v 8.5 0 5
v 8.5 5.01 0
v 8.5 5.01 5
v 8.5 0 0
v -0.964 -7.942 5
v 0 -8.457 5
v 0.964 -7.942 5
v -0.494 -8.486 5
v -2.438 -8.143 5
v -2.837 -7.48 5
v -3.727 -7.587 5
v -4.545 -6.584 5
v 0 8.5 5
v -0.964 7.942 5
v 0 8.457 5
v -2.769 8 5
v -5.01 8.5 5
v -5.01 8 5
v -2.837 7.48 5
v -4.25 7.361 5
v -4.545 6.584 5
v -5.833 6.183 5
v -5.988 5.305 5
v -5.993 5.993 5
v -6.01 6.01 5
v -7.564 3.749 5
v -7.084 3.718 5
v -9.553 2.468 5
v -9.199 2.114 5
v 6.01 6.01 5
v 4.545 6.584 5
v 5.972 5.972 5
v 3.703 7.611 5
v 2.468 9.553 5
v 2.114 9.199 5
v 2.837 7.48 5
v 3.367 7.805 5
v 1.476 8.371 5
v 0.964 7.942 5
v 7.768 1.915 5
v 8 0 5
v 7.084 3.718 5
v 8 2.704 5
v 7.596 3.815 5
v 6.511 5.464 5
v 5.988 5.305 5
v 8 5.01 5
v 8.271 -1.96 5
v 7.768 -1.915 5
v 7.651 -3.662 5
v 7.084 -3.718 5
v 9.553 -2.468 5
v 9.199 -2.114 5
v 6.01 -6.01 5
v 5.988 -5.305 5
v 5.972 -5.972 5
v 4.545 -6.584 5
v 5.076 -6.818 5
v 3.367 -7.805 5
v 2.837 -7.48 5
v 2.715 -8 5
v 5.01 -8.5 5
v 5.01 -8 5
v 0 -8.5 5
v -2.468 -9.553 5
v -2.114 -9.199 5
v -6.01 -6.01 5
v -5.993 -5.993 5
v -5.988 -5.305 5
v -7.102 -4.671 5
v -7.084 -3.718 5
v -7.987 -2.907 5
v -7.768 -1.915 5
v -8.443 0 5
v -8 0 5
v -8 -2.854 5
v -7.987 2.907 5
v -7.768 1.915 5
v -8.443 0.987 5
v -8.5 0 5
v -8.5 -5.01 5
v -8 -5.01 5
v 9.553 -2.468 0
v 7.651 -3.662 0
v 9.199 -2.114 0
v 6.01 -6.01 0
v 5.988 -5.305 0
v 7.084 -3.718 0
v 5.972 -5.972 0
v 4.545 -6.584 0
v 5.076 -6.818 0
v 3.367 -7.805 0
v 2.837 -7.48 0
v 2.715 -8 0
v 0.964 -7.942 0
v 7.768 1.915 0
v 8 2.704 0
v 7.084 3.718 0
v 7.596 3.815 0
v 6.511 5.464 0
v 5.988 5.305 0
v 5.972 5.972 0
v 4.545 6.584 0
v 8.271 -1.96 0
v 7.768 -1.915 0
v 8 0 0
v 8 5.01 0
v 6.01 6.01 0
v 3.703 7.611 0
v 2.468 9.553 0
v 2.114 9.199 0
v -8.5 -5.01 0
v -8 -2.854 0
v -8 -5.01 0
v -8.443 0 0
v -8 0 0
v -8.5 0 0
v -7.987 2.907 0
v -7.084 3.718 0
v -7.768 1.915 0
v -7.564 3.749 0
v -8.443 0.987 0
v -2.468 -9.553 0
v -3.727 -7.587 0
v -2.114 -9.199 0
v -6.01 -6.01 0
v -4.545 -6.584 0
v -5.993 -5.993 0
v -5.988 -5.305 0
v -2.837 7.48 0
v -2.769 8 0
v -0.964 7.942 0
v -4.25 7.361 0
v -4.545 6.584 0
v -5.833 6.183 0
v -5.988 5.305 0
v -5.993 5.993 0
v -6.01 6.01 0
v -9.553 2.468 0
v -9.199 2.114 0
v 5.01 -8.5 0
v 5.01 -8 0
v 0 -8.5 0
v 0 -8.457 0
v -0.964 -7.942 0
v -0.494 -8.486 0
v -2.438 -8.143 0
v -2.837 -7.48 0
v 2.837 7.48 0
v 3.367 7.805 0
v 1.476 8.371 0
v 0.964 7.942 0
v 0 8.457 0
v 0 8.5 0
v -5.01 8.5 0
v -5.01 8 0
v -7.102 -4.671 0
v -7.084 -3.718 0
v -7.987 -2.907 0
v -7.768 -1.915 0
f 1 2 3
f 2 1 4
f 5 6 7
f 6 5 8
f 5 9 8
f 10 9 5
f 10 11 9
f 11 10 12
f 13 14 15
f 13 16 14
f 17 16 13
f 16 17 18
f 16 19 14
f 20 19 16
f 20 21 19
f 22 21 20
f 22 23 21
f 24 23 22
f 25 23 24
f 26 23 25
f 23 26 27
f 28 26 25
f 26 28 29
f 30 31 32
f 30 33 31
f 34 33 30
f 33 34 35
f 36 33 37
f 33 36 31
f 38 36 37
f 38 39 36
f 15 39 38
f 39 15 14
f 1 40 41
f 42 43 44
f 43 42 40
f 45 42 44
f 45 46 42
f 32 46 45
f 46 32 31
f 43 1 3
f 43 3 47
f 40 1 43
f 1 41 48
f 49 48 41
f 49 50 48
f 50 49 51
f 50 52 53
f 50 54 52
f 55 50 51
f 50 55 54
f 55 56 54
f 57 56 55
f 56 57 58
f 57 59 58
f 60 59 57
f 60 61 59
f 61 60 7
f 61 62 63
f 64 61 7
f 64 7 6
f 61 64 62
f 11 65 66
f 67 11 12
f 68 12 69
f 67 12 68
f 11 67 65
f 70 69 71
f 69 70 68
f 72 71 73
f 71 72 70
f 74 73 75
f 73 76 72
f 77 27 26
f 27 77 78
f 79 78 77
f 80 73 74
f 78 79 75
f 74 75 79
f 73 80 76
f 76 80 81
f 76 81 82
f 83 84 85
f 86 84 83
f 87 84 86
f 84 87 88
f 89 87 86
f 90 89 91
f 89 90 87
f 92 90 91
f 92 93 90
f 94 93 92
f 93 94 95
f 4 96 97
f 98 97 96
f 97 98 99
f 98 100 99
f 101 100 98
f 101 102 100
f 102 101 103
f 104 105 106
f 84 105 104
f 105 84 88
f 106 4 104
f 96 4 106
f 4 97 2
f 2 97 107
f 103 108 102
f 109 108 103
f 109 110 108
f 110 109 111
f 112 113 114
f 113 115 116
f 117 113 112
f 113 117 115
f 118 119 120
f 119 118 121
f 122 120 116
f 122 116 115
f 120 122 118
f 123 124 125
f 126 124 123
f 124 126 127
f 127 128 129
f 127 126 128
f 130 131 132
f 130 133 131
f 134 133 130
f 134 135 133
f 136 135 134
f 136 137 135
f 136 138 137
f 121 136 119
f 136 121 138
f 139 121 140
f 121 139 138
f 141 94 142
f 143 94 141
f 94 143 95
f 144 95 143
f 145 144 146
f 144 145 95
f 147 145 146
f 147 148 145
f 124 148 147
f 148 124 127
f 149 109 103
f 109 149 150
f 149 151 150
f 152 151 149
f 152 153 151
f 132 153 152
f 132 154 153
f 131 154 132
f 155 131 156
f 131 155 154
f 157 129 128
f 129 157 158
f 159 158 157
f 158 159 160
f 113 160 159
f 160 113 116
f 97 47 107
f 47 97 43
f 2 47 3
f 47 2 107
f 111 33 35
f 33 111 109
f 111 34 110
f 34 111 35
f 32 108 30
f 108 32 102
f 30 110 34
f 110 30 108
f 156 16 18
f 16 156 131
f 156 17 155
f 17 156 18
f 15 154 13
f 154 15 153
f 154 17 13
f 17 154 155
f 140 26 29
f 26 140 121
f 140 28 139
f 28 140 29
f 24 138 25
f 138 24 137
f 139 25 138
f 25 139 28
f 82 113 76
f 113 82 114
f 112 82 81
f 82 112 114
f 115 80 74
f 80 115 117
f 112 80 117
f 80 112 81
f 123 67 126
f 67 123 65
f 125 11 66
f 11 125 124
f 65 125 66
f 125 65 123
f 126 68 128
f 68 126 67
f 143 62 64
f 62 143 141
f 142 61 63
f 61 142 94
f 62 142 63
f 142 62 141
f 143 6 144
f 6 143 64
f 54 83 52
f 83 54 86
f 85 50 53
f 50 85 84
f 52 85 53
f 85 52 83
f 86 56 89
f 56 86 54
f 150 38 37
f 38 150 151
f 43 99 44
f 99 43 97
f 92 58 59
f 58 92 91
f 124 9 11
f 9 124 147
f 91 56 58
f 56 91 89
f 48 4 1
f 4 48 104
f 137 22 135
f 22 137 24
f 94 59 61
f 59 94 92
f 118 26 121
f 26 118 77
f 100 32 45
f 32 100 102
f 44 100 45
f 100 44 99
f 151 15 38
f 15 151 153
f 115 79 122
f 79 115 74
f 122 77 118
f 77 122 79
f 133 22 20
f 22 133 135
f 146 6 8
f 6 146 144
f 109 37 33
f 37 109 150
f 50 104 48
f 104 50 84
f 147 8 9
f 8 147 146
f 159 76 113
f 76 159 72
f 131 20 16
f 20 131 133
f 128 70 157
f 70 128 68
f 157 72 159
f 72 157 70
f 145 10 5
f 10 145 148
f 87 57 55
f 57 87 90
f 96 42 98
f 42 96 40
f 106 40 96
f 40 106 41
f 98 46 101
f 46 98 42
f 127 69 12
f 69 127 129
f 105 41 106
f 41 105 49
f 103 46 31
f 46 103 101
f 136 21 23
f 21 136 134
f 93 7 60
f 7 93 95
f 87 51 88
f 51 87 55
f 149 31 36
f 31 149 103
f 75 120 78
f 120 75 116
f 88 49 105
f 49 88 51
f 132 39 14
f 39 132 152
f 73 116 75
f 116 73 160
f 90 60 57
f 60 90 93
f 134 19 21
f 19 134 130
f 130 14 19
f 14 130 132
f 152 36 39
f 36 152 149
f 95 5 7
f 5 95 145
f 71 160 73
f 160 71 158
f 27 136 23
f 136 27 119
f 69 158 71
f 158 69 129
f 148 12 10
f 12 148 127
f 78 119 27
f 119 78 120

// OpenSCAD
inch = 25.4;

module _bearing_spacer(h, or, ir, thickness, n, fudge) {
	fir = ir + thickness - fudge;

	color([.3, .5, .9]) {
		for(theta = [0 : 360.0/n : 360]) {
			rotate([0, 0, theta])
			translate([ir, 0, 0])
			cube([thickness, or*sqrt(1 - (fir*fir/(or*or))), h]);
		}

		difference() {
			cylinder(h = h, r = ir + thickness);

			translate([0, 0, -0.1])
			cylinder(h = h + 0.2, r = ir);
		}
	}
}

module bearing_spacer(h = 5, or = 0.38*inch, ir = 8, thickness = 0.5, n = 8,
                    fudge = -3735928559, center = false) {
	if (center) {
		translate([0, 0, -h/2]) {
			if (fudge == -3735928559) {
				_bearing_spacer(h = h, or = or, ir = ir, thickness = thickness,
				              n = n, fudge = thickness / 2);
			} else {
				_bearing_spacer(h = h, or = or, ir = ir, thickness = thickness,
				              n = n, fudge = fudge);
			}
		}
	} else {
		if (fudge == -3735928559) {
			_bearing_spacer(h = h, or = or, ir = ir, thickness = thickness,
			              n = n, fudge = thickness / 2);
		} else {
			_bearing_spacer(h = h, or = or, ir = ir, thickness = thickness,
			              n = n, fudge = fudge);
		}
	}
}

bearing_spacer();
